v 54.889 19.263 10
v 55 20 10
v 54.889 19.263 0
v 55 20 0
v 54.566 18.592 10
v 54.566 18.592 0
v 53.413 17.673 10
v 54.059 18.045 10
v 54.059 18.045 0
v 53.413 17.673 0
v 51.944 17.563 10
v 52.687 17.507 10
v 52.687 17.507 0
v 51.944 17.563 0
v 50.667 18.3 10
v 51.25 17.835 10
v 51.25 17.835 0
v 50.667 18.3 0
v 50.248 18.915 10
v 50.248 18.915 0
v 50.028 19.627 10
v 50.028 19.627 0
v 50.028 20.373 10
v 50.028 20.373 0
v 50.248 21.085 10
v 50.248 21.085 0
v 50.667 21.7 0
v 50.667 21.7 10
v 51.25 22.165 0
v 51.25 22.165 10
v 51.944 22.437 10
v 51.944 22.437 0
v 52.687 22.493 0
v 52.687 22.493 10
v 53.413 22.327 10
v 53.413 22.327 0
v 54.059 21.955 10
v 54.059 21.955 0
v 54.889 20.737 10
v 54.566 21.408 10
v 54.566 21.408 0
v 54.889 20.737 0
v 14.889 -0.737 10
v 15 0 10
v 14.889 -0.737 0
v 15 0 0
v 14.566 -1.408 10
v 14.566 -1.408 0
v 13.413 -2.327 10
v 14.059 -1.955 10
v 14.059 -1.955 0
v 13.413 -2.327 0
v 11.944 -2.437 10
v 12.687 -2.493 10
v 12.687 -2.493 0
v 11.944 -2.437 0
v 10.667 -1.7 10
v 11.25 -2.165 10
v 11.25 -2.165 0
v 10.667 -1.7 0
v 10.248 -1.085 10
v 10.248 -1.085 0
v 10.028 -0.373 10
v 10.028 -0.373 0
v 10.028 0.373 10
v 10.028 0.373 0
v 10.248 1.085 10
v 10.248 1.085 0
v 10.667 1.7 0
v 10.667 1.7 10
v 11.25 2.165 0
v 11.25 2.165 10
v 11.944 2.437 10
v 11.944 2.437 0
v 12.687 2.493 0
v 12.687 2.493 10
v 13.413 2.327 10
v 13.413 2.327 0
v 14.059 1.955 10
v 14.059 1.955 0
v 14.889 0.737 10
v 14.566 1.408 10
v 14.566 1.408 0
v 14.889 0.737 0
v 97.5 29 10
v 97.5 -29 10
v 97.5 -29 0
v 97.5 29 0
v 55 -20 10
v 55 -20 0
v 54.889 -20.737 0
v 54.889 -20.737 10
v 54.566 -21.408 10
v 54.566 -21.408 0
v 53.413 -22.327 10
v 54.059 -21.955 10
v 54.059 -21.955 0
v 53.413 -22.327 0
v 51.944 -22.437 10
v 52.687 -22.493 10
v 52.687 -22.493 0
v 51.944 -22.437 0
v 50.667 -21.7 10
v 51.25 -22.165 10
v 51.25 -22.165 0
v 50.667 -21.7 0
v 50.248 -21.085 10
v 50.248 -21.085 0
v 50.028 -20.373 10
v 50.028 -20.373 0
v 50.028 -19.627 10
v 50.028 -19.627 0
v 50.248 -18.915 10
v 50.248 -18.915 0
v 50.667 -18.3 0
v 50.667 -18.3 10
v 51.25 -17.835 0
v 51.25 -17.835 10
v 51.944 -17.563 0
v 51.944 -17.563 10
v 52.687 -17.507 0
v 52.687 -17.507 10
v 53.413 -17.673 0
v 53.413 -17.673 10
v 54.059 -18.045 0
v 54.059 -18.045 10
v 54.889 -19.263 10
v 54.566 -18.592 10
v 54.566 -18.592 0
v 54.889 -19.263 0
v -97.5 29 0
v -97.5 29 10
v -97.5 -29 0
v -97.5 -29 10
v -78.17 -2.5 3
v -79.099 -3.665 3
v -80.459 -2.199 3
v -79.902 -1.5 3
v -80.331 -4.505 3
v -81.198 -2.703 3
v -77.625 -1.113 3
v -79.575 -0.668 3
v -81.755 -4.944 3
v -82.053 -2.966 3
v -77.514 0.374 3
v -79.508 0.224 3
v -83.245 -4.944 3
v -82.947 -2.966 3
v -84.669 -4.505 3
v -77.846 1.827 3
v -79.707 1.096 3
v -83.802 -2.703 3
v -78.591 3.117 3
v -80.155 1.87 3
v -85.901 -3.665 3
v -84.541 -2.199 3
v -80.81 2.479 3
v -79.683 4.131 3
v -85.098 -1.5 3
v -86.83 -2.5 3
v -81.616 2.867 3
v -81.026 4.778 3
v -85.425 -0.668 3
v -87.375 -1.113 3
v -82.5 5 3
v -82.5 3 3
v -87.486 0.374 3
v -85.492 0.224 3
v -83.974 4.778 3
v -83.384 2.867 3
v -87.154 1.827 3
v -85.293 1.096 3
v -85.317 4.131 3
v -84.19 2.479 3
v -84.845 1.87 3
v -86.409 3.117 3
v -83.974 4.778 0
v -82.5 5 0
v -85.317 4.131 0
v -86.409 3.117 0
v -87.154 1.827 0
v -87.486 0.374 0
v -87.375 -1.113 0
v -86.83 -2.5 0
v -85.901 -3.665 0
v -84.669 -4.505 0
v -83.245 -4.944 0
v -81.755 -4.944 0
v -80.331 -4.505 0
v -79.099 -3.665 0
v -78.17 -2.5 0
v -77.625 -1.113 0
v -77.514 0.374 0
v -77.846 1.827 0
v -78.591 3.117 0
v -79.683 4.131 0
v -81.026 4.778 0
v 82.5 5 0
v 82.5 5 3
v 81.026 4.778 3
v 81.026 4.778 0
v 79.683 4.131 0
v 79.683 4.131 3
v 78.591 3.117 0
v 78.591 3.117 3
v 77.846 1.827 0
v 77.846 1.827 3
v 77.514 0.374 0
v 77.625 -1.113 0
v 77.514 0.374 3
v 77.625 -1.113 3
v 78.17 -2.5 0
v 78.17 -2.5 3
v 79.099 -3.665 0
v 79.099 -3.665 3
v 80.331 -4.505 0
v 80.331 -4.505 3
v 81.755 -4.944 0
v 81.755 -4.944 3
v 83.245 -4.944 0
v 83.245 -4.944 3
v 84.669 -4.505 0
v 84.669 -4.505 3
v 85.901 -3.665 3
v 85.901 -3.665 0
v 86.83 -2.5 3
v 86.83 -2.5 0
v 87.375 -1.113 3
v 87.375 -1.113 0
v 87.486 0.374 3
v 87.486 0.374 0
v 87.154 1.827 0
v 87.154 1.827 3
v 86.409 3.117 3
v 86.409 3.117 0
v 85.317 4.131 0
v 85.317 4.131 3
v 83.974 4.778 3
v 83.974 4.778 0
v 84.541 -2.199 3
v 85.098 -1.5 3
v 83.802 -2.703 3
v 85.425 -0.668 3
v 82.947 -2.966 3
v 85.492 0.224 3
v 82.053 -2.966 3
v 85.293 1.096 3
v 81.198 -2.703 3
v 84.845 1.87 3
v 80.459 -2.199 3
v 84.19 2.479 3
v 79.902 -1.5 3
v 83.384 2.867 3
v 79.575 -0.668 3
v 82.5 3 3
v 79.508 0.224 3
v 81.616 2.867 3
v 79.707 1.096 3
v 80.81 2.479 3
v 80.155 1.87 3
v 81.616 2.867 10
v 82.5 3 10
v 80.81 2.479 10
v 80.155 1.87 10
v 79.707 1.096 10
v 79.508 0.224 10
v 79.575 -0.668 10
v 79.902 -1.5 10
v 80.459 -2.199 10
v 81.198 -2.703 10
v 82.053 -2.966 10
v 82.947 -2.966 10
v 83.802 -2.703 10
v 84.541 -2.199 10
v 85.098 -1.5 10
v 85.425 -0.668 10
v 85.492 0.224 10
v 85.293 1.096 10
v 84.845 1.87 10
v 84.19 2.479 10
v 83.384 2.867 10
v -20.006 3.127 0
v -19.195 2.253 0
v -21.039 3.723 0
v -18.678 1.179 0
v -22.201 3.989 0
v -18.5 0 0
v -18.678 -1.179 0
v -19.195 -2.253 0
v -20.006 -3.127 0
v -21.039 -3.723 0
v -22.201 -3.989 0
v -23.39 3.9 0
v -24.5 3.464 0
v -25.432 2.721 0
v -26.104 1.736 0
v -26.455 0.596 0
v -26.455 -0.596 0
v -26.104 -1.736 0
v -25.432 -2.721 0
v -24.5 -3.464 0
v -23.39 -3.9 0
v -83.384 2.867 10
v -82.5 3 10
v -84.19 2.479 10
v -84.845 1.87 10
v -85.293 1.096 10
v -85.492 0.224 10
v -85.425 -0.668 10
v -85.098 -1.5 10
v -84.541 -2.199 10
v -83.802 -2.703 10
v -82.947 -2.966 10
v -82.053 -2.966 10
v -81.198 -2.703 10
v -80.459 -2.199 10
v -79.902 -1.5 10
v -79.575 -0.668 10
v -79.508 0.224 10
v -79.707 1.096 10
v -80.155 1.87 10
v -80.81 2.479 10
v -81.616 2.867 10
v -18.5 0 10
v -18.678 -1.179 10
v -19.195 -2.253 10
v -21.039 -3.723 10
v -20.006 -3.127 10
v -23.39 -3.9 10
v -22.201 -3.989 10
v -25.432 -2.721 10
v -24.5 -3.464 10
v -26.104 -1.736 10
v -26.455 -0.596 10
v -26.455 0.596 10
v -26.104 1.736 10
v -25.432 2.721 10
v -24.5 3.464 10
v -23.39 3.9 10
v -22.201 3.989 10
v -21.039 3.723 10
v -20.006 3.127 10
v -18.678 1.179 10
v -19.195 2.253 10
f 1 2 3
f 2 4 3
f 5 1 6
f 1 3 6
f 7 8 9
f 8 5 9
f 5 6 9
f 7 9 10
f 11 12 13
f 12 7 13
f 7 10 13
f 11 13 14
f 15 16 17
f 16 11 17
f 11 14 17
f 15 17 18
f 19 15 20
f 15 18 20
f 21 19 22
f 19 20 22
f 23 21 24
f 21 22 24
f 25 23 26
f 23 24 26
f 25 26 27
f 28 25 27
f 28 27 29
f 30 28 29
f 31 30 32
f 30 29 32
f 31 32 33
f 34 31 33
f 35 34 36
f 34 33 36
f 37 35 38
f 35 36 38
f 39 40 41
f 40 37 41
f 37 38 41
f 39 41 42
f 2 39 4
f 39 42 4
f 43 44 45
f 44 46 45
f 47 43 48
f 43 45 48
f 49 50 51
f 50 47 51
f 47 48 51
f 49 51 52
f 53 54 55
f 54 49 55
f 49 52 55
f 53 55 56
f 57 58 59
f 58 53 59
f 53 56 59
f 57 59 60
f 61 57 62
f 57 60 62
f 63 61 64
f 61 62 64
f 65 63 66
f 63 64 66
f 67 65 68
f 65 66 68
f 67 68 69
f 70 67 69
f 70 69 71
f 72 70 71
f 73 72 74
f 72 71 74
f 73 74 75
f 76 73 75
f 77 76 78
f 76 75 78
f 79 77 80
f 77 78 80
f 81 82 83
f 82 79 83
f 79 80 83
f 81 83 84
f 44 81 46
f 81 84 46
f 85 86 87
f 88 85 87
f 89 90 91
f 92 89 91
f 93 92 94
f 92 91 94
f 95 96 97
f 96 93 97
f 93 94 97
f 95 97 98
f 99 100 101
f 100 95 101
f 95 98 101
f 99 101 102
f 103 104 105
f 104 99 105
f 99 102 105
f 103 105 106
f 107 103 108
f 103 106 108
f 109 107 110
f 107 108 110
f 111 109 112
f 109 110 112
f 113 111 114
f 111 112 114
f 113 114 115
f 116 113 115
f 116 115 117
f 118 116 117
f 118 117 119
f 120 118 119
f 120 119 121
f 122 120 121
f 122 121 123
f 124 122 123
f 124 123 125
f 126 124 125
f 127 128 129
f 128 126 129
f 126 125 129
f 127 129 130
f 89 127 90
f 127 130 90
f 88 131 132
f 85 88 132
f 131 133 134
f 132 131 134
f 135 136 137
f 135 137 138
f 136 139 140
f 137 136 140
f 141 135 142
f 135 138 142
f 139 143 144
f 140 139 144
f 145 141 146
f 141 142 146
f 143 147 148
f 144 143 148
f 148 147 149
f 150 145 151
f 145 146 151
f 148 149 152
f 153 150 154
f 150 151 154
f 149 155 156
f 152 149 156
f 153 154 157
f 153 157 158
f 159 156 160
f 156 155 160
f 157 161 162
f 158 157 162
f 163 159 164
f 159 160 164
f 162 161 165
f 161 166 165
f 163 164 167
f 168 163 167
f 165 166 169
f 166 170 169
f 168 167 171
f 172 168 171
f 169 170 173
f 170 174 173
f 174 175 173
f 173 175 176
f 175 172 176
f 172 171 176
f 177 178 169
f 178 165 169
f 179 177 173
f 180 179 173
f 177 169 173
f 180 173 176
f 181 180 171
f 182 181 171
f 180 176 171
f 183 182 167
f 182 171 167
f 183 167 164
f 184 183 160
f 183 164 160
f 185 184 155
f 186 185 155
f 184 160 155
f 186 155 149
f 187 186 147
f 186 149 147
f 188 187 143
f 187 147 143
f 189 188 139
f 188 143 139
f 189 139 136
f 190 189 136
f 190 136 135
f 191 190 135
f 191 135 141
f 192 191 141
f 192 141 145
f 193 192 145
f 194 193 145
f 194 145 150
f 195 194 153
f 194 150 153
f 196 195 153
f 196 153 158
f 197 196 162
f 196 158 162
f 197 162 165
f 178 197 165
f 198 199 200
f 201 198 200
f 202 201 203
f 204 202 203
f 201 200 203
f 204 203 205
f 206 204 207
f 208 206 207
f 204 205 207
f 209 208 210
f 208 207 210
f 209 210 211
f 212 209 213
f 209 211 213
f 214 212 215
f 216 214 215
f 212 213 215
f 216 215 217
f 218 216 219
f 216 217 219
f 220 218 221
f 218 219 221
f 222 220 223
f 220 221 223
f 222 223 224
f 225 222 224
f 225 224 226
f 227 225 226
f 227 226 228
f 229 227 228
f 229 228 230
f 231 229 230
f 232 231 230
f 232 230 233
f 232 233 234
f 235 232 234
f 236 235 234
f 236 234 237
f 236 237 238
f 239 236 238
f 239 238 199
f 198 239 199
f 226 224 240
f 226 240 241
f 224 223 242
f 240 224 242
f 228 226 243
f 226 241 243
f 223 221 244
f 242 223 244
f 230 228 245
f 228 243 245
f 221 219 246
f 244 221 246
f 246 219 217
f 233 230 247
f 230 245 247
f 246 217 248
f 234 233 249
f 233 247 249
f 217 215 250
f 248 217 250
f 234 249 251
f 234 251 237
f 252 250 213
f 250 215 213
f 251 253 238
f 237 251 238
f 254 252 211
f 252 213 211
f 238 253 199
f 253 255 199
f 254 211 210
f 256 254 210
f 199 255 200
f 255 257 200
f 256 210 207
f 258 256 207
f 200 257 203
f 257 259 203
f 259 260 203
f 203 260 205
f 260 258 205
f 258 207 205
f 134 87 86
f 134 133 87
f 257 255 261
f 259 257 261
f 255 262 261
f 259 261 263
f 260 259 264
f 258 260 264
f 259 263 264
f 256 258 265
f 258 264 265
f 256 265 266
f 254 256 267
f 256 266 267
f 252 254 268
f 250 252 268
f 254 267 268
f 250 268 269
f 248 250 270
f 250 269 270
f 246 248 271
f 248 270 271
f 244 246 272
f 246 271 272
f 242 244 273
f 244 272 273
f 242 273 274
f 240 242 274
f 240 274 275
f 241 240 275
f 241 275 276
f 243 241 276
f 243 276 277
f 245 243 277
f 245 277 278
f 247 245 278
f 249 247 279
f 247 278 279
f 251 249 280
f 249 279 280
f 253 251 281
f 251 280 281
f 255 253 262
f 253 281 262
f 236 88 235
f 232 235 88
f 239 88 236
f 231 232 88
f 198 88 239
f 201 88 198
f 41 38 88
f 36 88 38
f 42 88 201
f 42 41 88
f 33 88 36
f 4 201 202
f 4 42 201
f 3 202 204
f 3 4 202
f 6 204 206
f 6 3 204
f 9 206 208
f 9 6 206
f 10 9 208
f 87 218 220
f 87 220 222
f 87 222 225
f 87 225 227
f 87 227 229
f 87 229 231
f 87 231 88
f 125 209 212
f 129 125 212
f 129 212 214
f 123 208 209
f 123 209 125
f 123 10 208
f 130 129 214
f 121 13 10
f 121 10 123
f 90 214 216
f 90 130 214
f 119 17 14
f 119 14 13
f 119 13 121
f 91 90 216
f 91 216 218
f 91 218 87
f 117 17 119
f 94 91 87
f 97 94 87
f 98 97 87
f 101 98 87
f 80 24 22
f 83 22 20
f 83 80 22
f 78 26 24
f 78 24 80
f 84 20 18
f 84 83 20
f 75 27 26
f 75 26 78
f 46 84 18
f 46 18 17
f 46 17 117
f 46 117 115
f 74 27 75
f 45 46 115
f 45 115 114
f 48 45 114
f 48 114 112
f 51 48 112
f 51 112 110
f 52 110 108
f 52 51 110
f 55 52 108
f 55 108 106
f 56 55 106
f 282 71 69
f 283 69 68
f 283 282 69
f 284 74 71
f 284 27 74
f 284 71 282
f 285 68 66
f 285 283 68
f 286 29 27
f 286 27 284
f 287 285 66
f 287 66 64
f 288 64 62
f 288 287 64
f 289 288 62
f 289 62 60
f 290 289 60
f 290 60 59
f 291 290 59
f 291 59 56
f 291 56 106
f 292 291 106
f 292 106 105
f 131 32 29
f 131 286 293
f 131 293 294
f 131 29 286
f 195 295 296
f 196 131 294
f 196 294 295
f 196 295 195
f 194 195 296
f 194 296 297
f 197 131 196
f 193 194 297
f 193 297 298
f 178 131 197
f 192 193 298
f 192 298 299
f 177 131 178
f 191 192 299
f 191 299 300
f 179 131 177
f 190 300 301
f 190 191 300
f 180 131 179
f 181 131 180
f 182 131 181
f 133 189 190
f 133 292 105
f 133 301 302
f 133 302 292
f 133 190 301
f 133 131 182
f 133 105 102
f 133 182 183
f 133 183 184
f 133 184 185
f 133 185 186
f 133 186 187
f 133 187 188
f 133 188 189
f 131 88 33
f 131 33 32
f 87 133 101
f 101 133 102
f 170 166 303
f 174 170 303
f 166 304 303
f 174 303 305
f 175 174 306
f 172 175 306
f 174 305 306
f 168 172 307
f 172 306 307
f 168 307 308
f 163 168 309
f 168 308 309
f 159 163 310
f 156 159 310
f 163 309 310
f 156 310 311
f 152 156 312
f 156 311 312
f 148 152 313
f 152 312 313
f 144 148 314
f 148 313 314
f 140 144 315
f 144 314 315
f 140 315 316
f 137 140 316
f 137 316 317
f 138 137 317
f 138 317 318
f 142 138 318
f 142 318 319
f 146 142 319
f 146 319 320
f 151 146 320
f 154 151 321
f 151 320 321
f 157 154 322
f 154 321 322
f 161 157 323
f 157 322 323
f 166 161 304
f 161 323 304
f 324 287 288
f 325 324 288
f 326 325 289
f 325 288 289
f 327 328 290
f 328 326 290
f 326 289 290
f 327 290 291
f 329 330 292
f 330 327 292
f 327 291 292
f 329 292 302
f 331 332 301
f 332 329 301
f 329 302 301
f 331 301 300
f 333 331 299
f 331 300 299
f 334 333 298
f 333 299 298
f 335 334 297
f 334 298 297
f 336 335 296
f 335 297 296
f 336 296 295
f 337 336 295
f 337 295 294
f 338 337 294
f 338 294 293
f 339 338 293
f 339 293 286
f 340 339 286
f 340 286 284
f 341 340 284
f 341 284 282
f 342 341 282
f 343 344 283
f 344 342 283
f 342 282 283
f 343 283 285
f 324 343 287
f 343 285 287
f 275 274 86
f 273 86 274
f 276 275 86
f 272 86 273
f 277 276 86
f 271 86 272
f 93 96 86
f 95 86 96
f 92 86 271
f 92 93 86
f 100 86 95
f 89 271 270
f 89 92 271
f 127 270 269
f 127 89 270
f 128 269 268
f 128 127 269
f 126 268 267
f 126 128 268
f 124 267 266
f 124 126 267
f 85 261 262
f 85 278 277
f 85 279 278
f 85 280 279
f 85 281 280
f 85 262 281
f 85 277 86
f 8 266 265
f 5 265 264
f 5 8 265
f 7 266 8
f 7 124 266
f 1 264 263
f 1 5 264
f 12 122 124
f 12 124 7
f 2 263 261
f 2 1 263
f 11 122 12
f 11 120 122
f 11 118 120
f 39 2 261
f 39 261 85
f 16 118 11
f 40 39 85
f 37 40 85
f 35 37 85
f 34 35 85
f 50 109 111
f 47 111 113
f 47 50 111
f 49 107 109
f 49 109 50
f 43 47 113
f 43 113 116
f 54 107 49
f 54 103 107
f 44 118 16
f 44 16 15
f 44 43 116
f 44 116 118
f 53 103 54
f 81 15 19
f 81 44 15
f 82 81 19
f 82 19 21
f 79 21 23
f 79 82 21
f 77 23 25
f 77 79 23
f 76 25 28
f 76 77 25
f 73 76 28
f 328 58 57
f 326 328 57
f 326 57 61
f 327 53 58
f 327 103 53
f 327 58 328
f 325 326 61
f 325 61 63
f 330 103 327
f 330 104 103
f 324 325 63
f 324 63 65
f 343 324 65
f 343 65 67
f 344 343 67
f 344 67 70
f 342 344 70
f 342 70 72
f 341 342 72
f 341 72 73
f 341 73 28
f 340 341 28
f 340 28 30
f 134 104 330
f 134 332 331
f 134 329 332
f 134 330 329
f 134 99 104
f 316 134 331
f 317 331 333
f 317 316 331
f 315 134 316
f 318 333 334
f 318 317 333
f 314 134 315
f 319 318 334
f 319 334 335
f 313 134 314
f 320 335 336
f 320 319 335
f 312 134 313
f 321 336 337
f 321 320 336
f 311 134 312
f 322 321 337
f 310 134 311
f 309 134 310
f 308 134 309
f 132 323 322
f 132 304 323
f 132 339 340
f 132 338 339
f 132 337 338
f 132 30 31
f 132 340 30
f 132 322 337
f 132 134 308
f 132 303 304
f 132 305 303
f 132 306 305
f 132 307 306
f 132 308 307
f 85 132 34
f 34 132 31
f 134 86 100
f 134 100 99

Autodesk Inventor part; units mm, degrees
ref_plane "YZ Plane" through (0, 0, 0) normal (1, 0, 0) x (0, 1, 0)
ref_plane "XZ Plane" through (0, 0, 0) normal (0, 1, 0) x (-1, 0, 0)
ref_plane "XY Plane" through (0, 0, 0) normal (0, 0, 1) x (1, 0, 0)
sketch "Sketch1" plane through (0, 0, 0) normal (0, 0, 1) x (1, 0, 0)
  line L0 (-57.5, 29) -> (57.5, 29)
  line L1 (57.5, 29) -> (57.5, -29)
  line L2 (57.5, -29) -> (-57.5, -29)
  line L3 (-57.5, -29) -> (-57.5, 29)
  circle A0 centre (12.5, 0) radius 2.5
  circle A1 centre (52.5, 20) radius 2.5
  circle A2 centre (52.5, -20) radius 2.5
  circle A3 centre (-22.5, 0) radius 4
  point P0 (0, 0)
  dimension "d0" = 115
  dimension "d1" = 58
  dimension "d2" = 29
  dimension "d3" = 57.5
  dimension "d4" = 5
  dimension "d5" = 45
  dimension "d6" = 29
  dimension "d7" = 5
  dimension "d8" = 5
  dimension "d9" = 5
  dimension "d11" = 5
  dimension "d13" = 8
  dimension "d14" = 80
  dimension "d15" = 29
  dimension "d18" = 40
  dimension "d19" = 20
  dimension "d20" = 20
extrude "Extrusion1" add sketch "Sketch1" along normal blind 10
sketch "Sketch3" plane through (-57.5, -29, 0) normal (-1, 0, 0) x (0, 0, 1)
  line L0 (0, 0) -> (0, 58) projected
  line L1 (0, 0) -> (10, 0) projected
  line L2 (10, 58) -> (10, 0) projected
  line L3 (0, 58) -> (10, 58) projected
  point P0 (0, 29)
extrude "Extrusion2" add sketch "Sketch3" along normal blind 40
sketch "Sketch4" plane through (57.5, -29, 0) normal (1, 0, 0) x (0, 0, -1)
  line L0 (0, 58) -> (0, 0) projected
  line L1 (0, 58) -> (-10, 58) projected
  line L2 (-10, 0) -> (-10, 58) projected
  line L3 (0, 0) -> (-10, 0) projected
  point P0 (0, 29)
extrude "Extrusion3" add sketch "Sketch4" along normal blind 40
hole "Hole1" at (82.5, 0, 0) direction (0, 0, 1) diameter 6 end through all counterbore diameter 10 counterbore depth 3
hole "Hole2" at (-82.5, 0, 0) direction (0, 0, 1) diameter 6 end through all counterbore diameter 10 counterbore depth 3
equation "\"d2\" = 0.5 * d1"
equation "\"d3\" = 0.5 * d0"
equation "\"d6\" = 0.5 * d1"
equation "\"d11\" = d9"
equation "\"d15\" = 0.5 * d1"
properties part number "suport maneta vid"
